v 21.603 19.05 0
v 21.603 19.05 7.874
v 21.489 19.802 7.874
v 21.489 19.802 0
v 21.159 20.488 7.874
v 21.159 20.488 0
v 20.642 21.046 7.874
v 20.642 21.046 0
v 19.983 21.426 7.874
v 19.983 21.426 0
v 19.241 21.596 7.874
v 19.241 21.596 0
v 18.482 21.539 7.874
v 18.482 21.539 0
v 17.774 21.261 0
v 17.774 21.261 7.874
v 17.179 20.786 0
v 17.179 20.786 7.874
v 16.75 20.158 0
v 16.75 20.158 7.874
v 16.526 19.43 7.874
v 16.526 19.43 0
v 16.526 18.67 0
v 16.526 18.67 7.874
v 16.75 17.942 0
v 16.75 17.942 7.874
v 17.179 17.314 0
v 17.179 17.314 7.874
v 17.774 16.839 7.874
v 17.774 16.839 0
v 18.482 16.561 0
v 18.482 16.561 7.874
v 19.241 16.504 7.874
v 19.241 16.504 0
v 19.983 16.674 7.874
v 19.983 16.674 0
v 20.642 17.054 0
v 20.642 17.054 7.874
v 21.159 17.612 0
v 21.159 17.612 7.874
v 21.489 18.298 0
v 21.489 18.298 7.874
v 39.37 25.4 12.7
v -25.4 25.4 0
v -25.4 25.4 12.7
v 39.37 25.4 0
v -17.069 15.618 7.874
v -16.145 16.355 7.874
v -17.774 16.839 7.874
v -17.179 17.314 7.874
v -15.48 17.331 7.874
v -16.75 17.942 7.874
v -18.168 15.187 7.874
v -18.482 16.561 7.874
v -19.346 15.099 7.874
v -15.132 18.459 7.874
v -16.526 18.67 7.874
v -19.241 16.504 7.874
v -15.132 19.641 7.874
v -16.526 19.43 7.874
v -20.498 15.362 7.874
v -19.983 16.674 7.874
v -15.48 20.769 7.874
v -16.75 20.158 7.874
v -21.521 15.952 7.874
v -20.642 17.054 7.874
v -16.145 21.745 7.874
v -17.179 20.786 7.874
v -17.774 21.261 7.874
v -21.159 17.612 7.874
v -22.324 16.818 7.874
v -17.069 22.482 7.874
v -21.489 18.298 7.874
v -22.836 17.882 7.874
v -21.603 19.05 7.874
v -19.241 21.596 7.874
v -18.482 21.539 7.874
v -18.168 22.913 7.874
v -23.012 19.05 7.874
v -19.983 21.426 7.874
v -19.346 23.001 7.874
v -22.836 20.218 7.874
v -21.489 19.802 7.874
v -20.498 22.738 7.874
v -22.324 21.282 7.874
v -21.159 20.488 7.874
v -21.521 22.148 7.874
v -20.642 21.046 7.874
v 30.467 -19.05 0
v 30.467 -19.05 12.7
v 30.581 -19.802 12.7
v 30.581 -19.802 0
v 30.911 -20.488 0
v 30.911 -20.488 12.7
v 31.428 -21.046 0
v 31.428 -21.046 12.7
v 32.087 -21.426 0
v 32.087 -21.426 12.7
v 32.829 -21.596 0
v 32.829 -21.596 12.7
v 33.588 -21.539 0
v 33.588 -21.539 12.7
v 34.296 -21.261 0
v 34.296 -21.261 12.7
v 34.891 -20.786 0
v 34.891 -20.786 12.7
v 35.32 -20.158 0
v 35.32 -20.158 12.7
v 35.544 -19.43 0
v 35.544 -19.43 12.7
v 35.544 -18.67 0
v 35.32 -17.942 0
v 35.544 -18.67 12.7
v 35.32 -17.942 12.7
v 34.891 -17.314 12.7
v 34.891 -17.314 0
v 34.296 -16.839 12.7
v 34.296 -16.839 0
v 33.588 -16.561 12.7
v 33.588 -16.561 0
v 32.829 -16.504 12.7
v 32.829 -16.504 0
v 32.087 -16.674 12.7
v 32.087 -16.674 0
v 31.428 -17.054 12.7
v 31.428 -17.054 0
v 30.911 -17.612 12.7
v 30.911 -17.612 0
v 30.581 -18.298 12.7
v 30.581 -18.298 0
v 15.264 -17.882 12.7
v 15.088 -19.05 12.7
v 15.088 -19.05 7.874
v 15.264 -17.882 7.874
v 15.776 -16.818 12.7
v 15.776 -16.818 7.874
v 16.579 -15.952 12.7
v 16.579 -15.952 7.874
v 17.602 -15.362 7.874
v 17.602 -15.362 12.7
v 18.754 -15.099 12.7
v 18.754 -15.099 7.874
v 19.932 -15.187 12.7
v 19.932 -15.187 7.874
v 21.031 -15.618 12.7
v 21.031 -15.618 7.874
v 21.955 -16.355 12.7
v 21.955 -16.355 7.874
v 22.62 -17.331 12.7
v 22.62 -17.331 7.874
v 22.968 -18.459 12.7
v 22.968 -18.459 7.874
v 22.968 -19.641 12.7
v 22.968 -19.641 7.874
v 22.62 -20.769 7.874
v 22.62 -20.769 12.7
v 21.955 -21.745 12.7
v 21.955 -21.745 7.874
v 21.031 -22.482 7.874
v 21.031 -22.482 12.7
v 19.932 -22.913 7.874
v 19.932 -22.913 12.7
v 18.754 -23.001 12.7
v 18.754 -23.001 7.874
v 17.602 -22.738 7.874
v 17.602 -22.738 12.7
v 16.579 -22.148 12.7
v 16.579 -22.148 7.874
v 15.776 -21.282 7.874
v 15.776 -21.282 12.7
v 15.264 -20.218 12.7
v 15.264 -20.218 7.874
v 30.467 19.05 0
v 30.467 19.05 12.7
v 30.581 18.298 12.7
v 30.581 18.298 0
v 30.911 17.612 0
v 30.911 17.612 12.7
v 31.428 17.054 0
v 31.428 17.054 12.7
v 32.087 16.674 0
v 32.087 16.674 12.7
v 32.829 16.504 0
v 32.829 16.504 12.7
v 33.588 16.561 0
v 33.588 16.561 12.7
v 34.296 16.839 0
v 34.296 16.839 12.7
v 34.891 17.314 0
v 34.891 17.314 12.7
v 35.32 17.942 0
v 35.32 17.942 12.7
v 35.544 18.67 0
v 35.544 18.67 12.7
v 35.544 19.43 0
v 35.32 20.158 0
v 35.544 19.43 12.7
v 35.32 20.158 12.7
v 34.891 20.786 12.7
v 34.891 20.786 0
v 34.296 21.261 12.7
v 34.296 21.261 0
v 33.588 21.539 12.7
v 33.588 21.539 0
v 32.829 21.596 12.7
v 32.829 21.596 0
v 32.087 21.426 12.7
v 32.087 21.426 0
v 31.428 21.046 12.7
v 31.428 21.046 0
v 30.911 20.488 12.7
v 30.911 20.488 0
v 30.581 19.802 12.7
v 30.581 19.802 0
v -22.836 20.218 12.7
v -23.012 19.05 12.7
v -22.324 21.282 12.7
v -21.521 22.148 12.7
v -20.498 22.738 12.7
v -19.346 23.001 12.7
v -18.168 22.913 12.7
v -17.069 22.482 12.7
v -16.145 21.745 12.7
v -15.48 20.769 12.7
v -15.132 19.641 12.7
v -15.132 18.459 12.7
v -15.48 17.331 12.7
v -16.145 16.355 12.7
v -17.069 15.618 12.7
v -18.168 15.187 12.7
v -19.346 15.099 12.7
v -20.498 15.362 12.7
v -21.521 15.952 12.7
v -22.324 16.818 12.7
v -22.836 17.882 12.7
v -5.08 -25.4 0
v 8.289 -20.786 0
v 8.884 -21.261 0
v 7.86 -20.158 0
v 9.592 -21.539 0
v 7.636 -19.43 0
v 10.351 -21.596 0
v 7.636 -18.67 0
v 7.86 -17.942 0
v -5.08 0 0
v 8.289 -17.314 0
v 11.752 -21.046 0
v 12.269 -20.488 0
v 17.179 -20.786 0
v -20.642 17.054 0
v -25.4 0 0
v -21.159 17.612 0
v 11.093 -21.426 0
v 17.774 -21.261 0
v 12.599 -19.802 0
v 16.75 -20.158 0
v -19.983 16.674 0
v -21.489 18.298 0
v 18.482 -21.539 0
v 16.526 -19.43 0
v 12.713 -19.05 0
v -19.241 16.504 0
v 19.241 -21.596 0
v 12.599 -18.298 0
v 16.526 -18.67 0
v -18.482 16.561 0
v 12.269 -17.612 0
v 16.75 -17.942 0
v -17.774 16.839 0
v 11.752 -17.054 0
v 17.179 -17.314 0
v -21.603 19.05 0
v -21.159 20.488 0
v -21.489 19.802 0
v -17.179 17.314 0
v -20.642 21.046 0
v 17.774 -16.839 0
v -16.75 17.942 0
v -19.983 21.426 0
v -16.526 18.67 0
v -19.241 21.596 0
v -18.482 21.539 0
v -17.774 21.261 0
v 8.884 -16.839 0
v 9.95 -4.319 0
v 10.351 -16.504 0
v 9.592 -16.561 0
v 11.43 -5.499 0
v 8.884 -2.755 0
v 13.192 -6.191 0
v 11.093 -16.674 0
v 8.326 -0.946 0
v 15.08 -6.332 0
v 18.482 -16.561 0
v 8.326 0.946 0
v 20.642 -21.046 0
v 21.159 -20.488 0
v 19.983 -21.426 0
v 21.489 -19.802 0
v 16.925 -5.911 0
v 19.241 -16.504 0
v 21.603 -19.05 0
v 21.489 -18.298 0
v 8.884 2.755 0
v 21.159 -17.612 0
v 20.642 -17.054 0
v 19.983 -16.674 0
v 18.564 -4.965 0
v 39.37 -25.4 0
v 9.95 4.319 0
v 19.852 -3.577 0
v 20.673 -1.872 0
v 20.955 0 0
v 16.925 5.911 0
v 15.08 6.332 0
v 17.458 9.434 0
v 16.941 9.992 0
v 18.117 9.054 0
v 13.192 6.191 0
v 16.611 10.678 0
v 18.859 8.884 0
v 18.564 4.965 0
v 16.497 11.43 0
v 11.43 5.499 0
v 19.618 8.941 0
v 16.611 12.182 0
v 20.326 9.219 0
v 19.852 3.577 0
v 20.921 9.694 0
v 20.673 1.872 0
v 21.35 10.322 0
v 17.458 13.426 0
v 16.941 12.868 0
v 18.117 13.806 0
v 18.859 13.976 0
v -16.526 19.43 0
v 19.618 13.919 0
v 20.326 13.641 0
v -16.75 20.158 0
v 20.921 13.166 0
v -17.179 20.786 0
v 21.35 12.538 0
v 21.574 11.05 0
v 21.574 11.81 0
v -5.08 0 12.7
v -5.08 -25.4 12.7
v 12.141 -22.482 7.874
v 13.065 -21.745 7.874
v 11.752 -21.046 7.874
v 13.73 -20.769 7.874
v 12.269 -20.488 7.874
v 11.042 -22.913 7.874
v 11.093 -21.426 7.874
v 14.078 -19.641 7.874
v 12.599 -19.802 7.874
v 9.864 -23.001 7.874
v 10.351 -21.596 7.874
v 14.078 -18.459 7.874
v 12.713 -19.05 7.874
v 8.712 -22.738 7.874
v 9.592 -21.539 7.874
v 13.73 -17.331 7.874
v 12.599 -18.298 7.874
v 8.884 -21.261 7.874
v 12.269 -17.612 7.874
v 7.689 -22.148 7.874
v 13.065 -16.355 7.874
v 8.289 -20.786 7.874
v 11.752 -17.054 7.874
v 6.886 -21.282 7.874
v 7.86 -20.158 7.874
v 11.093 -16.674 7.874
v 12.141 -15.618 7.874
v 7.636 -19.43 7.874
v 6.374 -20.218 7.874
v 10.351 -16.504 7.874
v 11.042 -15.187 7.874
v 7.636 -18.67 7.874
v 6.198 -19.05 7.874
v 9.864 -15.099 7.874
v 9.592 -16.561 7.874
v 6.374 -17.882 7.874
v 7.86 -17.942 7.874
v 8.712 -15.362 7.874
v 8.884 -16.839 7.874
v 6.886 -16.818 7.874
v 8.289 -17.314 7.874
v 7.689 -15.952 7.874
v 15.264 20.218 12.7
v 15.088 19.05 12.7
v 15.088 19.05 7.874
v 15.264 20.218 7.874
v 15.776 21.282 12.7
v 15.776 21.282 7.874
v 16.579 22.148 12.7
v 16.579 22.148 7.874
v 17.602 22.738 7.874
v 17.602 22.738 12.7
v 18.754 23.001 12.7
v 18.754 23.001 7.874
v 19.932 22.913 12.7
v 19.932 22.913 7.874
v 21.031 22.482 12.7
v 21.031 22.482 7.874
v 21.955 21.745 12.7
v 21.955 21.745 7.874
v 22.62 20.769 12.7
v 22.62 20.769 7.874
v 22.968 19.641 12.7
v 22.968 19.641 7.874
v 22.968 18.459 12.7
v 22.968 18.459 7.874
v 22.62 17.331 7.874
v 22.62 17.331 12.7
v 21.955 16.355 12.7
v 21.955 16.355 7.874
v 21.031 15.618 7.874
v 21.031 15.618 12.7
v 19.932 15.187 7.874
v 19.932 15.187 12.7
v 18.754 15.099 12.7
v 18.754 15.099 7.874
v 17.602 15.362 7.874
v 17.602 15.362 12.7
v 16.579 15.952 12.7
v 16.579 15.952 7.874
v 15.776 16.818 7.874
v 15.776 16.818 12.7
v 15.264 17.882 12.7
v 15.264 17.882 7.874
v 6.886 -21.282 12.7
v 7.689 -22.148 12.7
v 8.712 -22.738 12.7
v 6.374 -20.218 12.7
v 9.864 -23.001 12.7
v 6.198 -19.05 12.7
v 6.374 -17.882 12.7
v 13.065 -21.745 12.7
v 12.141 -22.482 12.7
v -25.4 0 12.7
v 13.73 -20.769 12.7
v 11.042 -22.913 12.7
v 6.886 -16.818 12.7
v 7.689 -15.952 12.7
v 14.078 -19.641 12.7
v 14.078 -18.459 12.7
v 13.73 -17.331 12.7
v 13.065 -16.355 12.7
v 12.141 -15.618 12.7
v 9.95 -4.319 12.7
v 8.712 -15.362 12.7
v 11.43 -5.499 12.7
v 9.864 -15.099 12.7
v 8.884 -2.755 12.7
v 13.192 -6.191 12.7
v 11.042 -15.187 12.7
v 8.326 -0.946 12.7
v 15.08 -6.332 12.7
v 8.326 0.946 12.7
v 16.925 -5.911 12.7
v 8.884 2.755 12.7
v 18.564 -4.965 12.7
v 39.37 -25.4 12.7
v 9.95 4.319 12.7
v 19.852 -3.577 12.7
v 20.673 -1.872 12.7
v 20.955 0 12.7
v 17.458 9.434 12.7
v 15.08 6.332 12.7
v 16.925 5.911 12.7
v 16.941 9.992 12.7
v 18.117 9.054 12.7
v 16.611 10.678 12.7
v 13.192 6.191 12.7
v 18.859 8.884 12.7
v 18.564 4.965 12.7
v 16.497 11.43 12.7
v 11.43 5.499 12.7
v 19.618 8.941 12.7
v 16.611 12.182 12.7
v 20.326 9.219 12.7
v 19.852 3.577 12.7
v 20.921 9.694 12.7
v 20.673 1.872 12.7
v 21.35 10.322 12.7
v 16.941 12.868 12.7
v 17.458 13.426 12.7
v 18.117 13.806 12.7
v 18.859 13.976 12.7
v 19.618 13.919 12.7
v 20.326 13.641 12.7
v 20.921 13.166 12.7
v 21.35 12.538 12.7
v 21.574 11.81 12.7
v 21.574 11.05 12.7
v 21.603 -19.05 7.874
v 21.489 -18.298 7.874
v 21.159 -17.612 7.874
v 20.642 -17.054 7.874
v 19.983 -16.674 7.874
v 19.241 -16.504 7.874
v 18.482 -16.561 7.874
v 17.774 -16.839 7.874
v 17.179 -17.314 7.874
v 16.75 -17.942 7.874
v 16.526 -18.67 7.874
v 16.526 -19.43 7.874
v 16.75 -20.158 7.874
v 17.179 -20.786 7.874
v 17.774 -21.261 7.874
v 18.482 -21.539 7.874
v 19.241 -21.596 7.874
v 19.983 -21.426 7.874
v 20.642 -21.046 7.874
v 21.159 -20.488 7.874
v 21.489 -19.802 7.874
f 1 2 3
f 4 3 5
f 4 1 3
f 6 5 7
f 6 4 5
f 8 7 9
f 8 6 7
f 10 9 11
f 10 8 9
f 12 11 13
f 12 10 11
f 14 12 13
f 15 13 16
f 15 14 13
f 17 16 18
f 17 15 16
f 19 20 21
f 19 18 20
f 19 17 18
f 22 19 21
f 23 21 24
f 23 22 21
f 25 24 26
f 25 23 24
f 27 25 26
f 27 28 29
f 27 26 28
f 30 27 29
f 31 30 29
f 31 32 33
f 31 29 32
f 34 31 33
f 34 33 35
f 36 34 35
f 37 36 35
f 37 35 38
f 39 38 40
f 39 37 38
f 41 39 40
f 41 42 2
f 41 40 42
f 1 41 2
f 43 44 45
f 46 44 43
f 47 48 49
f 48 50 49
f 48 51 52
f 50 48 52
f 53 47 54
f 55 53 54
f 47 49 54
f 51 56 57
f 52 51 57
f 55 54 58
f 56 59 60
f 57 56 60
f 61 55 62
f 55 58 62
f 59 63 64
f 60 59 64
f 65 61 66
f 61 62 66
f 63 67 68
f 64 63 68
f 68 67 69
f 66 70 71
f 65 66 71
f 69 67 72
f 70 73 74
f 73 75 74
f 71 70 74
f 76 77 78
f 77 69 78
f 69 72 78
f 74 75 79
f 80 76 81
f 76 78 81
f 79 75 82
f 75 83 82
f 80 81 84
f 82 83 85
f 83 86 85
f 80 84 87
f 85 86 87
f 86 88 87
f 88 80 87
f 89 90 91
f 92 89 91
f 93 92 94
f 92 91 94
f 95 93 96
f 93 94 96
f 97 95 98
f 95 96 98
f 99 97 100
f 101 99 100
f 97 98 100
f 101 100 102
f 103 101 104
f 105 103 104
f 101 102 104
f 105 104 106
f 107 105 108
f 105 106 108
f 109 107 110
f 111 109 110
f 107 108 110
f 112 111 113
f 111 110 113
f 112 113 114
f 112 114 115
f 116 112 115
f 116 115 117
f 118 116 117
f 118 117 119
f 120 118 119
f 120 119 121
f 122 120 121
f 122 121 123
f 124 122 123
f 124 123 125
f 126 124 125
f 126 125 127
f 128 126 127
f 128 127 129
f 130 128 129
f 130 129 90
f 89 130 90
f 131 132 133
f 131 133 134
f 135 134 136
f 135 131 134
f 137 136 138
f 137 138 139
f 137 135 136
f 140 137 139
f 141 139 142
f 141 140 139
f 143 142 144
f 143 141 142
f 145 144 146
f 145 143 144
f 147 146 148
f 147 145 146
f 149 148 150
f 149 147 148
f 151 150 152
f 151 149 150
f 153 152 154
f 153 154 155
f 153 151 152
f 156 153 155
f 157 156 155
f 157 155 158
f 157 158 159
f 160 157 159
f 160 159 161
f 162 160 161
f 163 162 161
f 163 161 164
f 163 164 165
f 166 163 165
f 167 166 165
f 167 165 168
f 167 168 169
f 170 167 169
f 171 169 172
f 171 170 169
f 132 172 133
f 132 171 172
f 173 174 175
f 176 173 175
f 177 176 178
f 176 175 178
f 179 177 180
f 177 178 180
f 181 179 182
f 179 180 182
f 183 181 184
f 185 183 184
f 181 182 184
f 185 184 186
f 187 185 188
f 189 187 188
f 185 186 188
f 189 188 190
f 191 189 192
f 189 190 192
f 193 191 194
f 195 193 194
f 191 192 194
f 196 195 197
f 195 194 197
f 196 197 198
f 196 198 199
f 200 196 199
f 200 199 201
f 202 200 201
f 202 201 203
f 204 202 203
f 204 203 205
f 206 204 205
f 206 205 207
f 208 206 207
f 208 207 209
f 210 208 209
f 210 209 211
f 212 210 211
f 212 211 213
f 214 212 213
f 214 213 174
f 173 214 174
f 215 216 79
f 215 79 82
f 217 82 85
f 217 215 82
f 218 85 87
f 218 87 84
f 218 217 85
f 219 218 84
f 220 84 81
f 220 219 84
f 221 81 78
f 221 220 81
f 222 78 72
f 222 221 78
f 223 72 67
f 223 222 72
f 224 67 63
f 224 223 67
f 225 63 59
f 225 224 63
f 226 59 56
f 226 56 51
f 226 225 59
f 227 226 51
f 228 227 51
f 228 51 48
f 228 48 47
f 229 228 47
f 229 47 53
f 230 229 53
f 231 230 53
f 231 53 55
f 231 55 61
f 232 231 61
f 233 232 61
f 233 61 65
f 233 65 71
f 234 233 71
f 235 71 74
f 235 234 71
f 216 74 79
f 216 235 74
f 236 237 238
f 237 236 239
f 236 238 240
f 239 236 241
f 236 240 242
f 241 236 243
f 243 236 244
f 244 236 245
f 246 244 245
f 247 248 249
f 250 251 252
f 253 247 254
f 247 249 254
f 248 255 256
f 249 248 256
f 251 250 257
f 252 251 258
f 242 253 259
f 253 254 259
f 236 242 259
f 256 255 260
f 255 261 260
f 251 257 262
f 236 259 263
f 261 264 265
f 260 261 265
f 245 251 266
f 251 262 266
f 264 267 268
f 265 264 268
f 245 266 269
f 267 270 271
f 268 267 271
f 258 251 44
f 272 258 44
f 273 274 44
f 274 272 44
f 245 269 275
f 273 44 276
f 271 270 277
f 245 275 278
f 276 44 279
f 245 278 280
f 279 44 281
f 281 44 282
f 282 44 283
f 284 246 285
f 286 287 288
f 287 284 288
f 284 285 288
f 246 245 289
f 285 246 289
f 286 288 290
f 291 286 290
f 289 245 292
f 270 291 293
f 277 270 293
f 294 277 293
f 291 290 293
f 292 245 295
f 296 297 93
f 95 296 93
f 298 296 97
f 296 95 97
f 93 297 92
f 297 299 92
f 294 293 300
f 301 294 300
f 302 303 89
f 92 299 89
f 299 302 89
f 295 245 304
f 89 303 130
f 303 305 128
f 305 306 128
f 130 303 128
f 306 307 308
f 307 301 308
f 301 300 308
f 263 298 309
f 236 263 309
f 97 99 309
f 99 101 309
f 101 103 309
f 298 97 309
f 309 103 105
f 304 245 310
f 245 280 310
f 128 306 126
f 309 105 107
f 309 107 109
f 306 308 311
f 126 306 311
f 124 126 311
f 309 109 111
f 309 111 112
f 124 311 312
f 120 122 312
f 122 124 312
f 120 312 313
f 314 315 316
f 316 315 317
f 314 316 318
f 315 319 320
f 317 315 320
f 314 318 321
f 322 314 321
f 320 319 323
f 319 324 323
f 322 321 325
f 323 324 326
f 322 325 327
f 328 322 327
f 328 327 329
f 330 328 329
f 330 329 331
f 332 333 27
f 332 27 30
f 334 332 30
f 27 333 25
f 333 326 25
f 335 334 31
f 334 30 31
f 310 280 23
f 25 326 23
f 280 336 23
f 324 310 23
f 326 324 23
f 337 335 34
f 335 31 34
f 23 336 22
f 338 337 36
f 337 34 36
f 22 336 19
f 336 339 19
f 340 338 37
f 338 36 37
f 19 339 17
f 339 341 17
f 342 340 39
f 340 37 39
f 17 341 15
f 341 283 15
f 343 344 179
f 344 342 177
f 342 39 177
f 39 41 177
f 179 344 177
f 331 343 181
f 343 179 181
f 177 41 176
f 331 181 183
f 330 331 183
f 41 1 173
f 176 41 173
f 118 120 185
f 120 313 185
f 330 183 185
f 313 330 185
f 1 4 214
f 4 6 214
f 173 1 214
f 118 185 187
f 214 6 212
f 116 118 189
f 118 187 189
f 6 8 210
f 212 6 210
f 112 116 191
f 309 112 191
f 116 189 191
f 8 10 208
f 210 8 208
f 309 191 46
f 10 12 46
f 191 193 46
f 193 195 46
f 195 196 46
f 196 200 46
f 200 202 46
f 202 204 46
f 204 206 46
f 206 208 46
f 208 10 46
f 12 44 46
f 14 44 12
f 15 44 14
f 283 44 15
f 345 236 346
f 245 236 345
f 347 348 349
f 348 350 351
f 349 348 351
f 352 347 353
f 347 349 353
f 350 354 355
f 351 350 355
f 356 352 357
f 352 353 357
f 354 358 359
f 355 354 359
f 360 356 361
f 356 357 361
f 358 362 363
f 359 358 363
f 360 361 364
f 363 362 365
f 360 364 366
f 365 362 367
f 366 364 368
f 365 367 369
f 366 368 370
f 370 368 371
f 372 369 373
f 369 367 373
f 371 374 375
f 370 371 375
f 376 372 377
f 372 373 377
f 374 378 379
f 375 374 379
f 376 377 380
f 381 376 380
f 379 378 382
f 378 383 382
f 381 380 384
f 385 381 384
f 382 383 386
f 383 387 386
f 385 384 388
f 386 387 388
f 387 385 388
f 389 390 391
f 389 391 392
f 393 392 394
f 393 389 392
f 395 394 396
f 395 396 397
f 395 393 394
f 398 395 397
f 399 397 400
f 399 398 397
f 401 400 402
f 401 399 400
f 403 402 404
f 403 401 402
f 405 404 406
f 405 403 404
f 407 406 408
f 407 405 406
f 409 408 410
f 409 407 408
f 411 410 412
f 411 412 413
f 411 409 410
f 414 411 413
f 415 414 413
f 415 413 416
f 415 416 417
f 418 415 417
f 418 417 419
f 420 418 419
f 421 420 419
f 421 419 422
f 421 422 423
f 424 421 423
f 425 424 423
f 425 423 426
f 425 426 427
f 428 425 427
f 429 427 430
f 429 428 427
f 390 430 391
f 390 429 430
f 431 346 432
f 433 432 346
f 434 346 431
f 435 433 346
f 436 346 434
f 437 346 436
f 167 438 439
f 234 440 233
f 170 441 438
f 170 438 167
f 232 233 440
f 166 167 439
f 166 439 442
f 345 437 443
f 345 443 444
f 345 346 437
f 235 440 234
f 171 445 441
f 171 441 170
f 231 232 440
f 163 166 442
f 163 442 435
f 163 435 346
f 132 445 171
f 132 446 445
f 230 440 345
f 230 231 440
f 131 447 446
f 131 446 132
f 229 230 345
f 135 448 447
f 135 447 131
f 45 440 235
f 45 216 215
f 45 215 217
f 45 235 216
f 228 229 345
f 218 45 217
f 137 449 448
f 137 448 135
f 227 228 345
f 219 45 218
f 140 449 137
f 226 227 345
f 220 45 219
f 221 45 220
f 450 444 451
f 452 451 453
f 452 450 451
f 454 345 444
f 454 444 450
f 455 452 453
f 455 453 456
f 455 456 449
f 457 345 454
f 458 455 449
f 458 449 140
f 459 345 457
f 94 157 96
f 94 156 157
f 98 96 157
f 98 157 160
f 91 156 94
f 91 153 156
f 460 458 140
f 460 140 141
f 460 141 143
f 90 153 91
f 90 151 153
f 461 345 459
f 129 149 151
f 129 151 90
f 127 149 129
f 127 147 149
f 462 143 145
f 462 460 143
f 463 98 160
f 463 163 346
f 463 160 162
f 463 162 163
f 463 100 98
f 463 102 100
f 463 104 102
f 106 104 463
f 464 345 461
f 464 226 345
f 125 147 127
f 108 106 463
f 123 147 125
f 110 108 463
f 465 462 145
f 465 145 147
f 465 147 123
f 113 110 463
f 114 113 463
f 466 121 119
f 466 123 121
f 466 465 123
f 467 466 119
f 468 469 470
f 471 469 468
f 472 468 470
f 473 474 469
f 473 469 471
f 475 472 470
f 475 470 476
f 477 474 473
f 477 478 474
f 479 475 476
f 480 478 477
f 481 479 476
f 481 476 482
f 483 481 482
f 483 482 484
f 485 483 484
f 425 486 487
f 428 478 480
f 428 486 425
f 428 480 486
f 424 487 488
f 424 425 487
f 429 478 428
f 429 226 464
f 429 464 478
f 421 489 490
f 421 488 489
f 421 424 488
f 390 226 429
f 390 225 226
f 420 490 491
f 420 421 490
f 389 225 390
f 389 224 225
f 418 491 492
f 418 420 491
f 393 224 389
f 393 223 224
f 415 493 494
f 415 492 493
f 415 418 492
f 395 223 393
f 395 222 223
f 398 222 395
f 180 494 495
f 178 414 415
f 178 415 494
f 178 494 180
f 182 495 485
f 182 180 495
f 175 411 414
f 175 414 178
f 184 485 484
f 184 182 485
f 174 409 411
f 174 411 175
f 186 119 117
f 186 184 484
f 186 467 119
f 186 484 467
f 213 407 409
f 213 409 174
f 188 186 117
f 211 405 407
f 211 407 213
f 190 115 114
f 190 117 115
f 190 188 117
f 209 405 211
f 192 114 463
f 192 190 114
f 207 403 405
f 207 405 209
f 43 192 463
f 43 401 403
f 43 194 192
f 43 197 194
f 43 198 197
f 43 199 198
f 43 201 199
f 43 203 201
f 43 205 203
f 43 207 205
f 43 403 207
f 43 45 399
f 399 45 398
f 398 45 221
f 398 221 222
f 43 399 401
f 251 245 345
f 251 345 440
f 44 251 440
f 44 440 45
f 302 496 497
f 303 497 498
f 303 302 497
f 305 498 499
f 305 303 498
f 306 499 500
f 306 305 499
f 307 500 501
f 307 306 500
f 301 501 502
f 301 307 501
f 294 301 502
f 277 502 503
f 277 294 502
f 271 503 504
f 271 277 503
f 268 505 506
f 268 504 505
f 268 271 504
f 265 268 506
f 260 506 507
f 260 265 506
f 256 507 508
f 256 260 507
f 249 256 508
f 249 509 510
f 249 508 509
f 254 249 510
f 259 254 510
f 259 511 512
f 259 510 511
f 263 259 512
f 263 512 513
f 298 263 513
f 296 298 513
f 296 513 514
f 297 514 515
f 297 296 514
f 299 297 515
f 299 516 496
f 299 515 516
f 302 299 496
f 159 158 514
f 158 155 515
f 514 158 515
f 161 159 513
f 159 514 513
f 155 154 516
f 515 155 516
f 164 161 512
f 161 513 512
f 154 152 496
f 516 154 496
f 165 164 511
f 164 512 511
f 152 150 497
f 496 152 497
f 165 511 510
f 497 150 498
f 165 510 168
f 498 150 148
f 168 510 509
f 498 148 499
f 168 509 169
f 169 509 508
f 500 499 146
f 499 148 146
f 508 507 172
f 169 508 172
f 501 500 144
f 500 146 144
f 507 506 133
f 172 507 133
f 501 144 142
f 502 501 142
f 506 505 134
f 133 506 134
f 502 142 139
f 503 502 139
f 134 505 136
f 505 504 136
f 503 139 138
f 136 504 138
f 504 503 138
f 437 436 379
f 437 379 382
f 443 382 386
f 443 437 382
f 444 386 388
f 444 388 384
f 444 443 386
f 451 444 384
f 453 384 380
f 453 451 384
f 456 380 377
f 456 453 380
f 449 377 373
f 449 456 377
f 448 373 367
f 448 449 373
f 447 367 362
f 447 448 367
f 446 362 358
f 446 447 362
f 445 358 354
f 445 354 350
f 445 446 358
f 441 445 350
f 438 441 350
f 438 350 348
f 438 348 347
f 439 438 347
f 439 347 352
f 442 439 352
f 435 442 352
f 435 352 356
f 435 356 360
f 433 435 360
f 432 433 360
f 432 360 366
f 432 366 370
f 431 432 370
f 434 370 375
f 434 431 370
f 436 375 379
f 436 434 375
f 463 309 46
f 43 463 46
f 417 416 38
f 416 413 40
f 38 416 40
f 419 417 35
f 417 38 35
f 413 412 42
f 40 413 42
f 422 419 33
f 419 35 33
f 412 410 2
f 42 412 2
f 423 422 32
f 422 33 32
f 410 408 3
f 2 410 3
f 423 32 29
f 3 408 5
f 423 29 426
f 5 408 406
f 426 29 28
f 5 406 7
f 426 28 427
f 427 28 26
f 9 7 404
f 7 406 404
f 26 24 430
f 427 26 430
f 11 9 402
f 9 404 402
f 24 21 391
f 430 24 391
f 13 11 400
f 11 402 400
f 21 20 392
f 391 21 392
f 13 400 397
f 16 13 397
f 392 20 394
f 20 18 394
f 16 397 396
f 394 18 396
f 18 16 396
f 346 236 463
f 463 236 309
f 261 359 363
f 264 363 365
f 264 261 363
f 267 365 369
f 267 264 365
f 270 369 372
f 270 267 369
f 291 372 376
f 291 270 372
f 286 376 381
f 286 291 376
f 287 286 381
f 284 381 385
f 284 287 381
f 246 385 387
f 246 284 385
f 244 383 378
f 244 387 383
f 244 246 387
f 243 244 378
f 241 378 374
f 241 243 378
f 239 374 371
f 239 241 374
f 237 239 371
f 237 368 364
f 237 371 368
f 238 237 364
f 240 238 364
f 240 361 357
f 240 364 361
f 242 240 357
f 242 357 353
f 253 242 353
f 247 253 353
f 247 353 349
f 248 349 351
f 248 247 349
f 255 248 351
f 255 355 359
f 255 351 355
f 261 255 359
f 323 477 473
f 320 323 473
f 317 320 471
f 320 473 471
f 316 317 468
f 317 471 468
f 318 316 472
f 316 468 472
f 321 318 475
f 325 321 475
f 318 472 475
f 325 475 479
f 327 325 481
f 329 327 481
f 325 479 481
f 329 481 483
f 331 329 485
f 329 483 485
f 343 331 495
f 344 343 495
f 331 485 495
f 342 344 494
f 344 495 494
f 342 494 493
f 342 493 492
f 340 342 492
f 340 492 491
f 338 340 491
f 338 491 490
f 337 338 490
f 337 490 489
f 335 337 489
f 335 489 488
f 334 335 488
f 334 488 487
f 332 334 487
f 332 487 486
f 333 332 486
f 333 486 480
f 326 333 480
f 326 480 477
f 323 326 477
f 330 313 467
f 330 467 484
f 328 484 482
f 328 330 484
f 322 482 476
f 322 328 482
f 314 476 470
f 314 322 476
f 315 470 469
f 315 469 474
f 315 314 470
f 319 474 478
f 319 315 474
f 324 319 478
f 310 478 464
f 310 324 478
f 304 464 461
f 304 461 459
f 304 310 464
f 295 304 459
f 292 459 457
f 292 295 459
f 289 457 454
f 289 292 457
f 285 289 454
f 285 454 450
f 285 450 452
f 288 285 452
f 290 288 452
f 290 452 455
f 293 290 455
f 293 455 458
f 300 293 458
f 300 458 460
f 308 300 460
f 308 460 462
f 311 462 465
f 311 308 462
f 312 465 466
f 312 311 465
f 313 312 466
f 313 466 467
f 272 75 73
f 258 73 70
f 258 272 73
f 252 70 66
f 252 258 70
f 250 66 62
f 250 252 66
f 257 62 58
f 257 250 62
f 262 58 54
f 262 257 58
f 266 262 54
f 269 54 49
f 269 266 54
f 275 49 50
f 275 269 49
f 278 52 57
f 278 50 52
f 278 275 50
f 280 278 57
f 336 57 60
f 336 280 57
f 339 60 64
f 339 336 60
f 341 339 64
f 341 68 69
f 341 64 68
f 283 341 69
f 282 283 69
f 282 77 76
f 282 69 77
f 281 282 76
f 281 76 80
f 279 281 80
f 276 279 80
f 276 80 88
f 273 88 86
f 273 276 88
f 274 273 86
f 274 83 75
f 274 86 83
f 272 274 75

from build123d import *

# Parameters (mm, degrees)
SKETCH1_W                      = 64.77
SKETCH1_H                      = 50.8
SKETCH1_R                      = 2.5527
SKETCH1_R_2                    = 6.35
BOSS_EXTRUDE1_DEPTH            = 12.7
F_7_0_201_DIAMETER_HOLE1_D     = 5.1054
F_7_0_201_DIAMETER_HOLE1_DEPTH = 70.104
F_7_0_201_DIAMETER_HOLE1_TIP   = 1.533816902
SKETCH6_R                      = 3.9624
CUT_EXTRUDE1_DEPTH             = 4.826
SKETCH7_W                      = 20.32
SKETCH7_H                      = 25.4
CUT_EXTRUDE2_DEPTH             = 49.543247728


with BuildPart() as part:
    # Sketch1 → Boss-Extrude1 (new body)
    with BuildSketch(Plane.XY):
        with Locations((6.985, 0)):
            Rectangle(SKETCH1_W, SKETCH1_H)
        with Locations(Location((-19.05, 19.05, 0), (0, 0, 180))):
            Circle(SKETCH1_R, mode=Mode.SUBTRACT)
        with Locations((19.05, 19.05)):
            Circle(SKETCH1_R, mode=Mode.SUBTRACT)
        with Locations((19.05, -19.05)):
            Circle(SKETCH1_R, mode=Mode.SUBTRACT)
        with Locations((10.16, -19.05)):
            Circle(SKETCH1_R, mode=Mode.SUBTRACT)
        with Locations((14.605, 0)):
            Circle(SKETCH1_R_2, mode=Mode.SUBTRACT)
    extrude(amount=BOSS_EXTRUDE1_DEPTH)

    # #7 (0.201) Diameter Hole1
    with Locations(Plane(origin=(-24.721209515, -12.864288698, 0), x_dir=(1, 0, 0), z_dir=(0, 0, -1))):
        with Locations((57.741209515, 6.185711302), (57.741209515, -31.914288698), (43.771209515, -24.294288698)):
            Hole(F_7_0_201_DIAMETER_HOLE1_D / 2, depth=F_7_0_201_DIAMETER_HOLE1_DEPTH)
            with Locations((0, 0, -(F_7_0_201_DIAMETER_HOLE1_DEPTH + F_7_0_201_DIAMETER_HOLE1_TIP / 2))):  # 118° drill point
                Cone(0, F_7_0_201_DIAMETER_HOLE1_D / 2, F_7_0_201_DIAMETER_HOLE1_TIP, mode=Mode.SUBTRACT)

    # Sketch6 → Cut-Extrude1 (cut)
    with BuildSketch(Plane(origin=(0, 0, 12.7), x_dir=(-1, 0, 0), z_dir=(0, 0, -1))):
        with Locations((-19.05, 19.05)):
            Circle(SKETCH6_R)
        with Locations((-19.05, -19.05)):
            Circle(SKETCH6_R)
        with Locations((-10.16, -19.05)):
            Circle(SKETCH6_R)
        with Locations((19.05, 19.05)):
            Circle(SKETCH6_R)
    extrude(amount=CUT_EXTRUDE1_DEPTH, mode=Mode.SUBTRACT)

    # Sketch7 → Cut-Extrude2 (cut, through all)
    with BuildSketch(Plane(origin=(0, 0, 0), x_dir=(-1, 0, 0), z_dir=(0, 0, -1))):
        with Locations((15.24, -12.7)):
            Rectangle(SKETCH7_W, SKETCH7_H)
    extrude(amount=-CUT_EXTRUDE2_DEPTH, mode=Mode.SUBTRACT)


solid = part.part
